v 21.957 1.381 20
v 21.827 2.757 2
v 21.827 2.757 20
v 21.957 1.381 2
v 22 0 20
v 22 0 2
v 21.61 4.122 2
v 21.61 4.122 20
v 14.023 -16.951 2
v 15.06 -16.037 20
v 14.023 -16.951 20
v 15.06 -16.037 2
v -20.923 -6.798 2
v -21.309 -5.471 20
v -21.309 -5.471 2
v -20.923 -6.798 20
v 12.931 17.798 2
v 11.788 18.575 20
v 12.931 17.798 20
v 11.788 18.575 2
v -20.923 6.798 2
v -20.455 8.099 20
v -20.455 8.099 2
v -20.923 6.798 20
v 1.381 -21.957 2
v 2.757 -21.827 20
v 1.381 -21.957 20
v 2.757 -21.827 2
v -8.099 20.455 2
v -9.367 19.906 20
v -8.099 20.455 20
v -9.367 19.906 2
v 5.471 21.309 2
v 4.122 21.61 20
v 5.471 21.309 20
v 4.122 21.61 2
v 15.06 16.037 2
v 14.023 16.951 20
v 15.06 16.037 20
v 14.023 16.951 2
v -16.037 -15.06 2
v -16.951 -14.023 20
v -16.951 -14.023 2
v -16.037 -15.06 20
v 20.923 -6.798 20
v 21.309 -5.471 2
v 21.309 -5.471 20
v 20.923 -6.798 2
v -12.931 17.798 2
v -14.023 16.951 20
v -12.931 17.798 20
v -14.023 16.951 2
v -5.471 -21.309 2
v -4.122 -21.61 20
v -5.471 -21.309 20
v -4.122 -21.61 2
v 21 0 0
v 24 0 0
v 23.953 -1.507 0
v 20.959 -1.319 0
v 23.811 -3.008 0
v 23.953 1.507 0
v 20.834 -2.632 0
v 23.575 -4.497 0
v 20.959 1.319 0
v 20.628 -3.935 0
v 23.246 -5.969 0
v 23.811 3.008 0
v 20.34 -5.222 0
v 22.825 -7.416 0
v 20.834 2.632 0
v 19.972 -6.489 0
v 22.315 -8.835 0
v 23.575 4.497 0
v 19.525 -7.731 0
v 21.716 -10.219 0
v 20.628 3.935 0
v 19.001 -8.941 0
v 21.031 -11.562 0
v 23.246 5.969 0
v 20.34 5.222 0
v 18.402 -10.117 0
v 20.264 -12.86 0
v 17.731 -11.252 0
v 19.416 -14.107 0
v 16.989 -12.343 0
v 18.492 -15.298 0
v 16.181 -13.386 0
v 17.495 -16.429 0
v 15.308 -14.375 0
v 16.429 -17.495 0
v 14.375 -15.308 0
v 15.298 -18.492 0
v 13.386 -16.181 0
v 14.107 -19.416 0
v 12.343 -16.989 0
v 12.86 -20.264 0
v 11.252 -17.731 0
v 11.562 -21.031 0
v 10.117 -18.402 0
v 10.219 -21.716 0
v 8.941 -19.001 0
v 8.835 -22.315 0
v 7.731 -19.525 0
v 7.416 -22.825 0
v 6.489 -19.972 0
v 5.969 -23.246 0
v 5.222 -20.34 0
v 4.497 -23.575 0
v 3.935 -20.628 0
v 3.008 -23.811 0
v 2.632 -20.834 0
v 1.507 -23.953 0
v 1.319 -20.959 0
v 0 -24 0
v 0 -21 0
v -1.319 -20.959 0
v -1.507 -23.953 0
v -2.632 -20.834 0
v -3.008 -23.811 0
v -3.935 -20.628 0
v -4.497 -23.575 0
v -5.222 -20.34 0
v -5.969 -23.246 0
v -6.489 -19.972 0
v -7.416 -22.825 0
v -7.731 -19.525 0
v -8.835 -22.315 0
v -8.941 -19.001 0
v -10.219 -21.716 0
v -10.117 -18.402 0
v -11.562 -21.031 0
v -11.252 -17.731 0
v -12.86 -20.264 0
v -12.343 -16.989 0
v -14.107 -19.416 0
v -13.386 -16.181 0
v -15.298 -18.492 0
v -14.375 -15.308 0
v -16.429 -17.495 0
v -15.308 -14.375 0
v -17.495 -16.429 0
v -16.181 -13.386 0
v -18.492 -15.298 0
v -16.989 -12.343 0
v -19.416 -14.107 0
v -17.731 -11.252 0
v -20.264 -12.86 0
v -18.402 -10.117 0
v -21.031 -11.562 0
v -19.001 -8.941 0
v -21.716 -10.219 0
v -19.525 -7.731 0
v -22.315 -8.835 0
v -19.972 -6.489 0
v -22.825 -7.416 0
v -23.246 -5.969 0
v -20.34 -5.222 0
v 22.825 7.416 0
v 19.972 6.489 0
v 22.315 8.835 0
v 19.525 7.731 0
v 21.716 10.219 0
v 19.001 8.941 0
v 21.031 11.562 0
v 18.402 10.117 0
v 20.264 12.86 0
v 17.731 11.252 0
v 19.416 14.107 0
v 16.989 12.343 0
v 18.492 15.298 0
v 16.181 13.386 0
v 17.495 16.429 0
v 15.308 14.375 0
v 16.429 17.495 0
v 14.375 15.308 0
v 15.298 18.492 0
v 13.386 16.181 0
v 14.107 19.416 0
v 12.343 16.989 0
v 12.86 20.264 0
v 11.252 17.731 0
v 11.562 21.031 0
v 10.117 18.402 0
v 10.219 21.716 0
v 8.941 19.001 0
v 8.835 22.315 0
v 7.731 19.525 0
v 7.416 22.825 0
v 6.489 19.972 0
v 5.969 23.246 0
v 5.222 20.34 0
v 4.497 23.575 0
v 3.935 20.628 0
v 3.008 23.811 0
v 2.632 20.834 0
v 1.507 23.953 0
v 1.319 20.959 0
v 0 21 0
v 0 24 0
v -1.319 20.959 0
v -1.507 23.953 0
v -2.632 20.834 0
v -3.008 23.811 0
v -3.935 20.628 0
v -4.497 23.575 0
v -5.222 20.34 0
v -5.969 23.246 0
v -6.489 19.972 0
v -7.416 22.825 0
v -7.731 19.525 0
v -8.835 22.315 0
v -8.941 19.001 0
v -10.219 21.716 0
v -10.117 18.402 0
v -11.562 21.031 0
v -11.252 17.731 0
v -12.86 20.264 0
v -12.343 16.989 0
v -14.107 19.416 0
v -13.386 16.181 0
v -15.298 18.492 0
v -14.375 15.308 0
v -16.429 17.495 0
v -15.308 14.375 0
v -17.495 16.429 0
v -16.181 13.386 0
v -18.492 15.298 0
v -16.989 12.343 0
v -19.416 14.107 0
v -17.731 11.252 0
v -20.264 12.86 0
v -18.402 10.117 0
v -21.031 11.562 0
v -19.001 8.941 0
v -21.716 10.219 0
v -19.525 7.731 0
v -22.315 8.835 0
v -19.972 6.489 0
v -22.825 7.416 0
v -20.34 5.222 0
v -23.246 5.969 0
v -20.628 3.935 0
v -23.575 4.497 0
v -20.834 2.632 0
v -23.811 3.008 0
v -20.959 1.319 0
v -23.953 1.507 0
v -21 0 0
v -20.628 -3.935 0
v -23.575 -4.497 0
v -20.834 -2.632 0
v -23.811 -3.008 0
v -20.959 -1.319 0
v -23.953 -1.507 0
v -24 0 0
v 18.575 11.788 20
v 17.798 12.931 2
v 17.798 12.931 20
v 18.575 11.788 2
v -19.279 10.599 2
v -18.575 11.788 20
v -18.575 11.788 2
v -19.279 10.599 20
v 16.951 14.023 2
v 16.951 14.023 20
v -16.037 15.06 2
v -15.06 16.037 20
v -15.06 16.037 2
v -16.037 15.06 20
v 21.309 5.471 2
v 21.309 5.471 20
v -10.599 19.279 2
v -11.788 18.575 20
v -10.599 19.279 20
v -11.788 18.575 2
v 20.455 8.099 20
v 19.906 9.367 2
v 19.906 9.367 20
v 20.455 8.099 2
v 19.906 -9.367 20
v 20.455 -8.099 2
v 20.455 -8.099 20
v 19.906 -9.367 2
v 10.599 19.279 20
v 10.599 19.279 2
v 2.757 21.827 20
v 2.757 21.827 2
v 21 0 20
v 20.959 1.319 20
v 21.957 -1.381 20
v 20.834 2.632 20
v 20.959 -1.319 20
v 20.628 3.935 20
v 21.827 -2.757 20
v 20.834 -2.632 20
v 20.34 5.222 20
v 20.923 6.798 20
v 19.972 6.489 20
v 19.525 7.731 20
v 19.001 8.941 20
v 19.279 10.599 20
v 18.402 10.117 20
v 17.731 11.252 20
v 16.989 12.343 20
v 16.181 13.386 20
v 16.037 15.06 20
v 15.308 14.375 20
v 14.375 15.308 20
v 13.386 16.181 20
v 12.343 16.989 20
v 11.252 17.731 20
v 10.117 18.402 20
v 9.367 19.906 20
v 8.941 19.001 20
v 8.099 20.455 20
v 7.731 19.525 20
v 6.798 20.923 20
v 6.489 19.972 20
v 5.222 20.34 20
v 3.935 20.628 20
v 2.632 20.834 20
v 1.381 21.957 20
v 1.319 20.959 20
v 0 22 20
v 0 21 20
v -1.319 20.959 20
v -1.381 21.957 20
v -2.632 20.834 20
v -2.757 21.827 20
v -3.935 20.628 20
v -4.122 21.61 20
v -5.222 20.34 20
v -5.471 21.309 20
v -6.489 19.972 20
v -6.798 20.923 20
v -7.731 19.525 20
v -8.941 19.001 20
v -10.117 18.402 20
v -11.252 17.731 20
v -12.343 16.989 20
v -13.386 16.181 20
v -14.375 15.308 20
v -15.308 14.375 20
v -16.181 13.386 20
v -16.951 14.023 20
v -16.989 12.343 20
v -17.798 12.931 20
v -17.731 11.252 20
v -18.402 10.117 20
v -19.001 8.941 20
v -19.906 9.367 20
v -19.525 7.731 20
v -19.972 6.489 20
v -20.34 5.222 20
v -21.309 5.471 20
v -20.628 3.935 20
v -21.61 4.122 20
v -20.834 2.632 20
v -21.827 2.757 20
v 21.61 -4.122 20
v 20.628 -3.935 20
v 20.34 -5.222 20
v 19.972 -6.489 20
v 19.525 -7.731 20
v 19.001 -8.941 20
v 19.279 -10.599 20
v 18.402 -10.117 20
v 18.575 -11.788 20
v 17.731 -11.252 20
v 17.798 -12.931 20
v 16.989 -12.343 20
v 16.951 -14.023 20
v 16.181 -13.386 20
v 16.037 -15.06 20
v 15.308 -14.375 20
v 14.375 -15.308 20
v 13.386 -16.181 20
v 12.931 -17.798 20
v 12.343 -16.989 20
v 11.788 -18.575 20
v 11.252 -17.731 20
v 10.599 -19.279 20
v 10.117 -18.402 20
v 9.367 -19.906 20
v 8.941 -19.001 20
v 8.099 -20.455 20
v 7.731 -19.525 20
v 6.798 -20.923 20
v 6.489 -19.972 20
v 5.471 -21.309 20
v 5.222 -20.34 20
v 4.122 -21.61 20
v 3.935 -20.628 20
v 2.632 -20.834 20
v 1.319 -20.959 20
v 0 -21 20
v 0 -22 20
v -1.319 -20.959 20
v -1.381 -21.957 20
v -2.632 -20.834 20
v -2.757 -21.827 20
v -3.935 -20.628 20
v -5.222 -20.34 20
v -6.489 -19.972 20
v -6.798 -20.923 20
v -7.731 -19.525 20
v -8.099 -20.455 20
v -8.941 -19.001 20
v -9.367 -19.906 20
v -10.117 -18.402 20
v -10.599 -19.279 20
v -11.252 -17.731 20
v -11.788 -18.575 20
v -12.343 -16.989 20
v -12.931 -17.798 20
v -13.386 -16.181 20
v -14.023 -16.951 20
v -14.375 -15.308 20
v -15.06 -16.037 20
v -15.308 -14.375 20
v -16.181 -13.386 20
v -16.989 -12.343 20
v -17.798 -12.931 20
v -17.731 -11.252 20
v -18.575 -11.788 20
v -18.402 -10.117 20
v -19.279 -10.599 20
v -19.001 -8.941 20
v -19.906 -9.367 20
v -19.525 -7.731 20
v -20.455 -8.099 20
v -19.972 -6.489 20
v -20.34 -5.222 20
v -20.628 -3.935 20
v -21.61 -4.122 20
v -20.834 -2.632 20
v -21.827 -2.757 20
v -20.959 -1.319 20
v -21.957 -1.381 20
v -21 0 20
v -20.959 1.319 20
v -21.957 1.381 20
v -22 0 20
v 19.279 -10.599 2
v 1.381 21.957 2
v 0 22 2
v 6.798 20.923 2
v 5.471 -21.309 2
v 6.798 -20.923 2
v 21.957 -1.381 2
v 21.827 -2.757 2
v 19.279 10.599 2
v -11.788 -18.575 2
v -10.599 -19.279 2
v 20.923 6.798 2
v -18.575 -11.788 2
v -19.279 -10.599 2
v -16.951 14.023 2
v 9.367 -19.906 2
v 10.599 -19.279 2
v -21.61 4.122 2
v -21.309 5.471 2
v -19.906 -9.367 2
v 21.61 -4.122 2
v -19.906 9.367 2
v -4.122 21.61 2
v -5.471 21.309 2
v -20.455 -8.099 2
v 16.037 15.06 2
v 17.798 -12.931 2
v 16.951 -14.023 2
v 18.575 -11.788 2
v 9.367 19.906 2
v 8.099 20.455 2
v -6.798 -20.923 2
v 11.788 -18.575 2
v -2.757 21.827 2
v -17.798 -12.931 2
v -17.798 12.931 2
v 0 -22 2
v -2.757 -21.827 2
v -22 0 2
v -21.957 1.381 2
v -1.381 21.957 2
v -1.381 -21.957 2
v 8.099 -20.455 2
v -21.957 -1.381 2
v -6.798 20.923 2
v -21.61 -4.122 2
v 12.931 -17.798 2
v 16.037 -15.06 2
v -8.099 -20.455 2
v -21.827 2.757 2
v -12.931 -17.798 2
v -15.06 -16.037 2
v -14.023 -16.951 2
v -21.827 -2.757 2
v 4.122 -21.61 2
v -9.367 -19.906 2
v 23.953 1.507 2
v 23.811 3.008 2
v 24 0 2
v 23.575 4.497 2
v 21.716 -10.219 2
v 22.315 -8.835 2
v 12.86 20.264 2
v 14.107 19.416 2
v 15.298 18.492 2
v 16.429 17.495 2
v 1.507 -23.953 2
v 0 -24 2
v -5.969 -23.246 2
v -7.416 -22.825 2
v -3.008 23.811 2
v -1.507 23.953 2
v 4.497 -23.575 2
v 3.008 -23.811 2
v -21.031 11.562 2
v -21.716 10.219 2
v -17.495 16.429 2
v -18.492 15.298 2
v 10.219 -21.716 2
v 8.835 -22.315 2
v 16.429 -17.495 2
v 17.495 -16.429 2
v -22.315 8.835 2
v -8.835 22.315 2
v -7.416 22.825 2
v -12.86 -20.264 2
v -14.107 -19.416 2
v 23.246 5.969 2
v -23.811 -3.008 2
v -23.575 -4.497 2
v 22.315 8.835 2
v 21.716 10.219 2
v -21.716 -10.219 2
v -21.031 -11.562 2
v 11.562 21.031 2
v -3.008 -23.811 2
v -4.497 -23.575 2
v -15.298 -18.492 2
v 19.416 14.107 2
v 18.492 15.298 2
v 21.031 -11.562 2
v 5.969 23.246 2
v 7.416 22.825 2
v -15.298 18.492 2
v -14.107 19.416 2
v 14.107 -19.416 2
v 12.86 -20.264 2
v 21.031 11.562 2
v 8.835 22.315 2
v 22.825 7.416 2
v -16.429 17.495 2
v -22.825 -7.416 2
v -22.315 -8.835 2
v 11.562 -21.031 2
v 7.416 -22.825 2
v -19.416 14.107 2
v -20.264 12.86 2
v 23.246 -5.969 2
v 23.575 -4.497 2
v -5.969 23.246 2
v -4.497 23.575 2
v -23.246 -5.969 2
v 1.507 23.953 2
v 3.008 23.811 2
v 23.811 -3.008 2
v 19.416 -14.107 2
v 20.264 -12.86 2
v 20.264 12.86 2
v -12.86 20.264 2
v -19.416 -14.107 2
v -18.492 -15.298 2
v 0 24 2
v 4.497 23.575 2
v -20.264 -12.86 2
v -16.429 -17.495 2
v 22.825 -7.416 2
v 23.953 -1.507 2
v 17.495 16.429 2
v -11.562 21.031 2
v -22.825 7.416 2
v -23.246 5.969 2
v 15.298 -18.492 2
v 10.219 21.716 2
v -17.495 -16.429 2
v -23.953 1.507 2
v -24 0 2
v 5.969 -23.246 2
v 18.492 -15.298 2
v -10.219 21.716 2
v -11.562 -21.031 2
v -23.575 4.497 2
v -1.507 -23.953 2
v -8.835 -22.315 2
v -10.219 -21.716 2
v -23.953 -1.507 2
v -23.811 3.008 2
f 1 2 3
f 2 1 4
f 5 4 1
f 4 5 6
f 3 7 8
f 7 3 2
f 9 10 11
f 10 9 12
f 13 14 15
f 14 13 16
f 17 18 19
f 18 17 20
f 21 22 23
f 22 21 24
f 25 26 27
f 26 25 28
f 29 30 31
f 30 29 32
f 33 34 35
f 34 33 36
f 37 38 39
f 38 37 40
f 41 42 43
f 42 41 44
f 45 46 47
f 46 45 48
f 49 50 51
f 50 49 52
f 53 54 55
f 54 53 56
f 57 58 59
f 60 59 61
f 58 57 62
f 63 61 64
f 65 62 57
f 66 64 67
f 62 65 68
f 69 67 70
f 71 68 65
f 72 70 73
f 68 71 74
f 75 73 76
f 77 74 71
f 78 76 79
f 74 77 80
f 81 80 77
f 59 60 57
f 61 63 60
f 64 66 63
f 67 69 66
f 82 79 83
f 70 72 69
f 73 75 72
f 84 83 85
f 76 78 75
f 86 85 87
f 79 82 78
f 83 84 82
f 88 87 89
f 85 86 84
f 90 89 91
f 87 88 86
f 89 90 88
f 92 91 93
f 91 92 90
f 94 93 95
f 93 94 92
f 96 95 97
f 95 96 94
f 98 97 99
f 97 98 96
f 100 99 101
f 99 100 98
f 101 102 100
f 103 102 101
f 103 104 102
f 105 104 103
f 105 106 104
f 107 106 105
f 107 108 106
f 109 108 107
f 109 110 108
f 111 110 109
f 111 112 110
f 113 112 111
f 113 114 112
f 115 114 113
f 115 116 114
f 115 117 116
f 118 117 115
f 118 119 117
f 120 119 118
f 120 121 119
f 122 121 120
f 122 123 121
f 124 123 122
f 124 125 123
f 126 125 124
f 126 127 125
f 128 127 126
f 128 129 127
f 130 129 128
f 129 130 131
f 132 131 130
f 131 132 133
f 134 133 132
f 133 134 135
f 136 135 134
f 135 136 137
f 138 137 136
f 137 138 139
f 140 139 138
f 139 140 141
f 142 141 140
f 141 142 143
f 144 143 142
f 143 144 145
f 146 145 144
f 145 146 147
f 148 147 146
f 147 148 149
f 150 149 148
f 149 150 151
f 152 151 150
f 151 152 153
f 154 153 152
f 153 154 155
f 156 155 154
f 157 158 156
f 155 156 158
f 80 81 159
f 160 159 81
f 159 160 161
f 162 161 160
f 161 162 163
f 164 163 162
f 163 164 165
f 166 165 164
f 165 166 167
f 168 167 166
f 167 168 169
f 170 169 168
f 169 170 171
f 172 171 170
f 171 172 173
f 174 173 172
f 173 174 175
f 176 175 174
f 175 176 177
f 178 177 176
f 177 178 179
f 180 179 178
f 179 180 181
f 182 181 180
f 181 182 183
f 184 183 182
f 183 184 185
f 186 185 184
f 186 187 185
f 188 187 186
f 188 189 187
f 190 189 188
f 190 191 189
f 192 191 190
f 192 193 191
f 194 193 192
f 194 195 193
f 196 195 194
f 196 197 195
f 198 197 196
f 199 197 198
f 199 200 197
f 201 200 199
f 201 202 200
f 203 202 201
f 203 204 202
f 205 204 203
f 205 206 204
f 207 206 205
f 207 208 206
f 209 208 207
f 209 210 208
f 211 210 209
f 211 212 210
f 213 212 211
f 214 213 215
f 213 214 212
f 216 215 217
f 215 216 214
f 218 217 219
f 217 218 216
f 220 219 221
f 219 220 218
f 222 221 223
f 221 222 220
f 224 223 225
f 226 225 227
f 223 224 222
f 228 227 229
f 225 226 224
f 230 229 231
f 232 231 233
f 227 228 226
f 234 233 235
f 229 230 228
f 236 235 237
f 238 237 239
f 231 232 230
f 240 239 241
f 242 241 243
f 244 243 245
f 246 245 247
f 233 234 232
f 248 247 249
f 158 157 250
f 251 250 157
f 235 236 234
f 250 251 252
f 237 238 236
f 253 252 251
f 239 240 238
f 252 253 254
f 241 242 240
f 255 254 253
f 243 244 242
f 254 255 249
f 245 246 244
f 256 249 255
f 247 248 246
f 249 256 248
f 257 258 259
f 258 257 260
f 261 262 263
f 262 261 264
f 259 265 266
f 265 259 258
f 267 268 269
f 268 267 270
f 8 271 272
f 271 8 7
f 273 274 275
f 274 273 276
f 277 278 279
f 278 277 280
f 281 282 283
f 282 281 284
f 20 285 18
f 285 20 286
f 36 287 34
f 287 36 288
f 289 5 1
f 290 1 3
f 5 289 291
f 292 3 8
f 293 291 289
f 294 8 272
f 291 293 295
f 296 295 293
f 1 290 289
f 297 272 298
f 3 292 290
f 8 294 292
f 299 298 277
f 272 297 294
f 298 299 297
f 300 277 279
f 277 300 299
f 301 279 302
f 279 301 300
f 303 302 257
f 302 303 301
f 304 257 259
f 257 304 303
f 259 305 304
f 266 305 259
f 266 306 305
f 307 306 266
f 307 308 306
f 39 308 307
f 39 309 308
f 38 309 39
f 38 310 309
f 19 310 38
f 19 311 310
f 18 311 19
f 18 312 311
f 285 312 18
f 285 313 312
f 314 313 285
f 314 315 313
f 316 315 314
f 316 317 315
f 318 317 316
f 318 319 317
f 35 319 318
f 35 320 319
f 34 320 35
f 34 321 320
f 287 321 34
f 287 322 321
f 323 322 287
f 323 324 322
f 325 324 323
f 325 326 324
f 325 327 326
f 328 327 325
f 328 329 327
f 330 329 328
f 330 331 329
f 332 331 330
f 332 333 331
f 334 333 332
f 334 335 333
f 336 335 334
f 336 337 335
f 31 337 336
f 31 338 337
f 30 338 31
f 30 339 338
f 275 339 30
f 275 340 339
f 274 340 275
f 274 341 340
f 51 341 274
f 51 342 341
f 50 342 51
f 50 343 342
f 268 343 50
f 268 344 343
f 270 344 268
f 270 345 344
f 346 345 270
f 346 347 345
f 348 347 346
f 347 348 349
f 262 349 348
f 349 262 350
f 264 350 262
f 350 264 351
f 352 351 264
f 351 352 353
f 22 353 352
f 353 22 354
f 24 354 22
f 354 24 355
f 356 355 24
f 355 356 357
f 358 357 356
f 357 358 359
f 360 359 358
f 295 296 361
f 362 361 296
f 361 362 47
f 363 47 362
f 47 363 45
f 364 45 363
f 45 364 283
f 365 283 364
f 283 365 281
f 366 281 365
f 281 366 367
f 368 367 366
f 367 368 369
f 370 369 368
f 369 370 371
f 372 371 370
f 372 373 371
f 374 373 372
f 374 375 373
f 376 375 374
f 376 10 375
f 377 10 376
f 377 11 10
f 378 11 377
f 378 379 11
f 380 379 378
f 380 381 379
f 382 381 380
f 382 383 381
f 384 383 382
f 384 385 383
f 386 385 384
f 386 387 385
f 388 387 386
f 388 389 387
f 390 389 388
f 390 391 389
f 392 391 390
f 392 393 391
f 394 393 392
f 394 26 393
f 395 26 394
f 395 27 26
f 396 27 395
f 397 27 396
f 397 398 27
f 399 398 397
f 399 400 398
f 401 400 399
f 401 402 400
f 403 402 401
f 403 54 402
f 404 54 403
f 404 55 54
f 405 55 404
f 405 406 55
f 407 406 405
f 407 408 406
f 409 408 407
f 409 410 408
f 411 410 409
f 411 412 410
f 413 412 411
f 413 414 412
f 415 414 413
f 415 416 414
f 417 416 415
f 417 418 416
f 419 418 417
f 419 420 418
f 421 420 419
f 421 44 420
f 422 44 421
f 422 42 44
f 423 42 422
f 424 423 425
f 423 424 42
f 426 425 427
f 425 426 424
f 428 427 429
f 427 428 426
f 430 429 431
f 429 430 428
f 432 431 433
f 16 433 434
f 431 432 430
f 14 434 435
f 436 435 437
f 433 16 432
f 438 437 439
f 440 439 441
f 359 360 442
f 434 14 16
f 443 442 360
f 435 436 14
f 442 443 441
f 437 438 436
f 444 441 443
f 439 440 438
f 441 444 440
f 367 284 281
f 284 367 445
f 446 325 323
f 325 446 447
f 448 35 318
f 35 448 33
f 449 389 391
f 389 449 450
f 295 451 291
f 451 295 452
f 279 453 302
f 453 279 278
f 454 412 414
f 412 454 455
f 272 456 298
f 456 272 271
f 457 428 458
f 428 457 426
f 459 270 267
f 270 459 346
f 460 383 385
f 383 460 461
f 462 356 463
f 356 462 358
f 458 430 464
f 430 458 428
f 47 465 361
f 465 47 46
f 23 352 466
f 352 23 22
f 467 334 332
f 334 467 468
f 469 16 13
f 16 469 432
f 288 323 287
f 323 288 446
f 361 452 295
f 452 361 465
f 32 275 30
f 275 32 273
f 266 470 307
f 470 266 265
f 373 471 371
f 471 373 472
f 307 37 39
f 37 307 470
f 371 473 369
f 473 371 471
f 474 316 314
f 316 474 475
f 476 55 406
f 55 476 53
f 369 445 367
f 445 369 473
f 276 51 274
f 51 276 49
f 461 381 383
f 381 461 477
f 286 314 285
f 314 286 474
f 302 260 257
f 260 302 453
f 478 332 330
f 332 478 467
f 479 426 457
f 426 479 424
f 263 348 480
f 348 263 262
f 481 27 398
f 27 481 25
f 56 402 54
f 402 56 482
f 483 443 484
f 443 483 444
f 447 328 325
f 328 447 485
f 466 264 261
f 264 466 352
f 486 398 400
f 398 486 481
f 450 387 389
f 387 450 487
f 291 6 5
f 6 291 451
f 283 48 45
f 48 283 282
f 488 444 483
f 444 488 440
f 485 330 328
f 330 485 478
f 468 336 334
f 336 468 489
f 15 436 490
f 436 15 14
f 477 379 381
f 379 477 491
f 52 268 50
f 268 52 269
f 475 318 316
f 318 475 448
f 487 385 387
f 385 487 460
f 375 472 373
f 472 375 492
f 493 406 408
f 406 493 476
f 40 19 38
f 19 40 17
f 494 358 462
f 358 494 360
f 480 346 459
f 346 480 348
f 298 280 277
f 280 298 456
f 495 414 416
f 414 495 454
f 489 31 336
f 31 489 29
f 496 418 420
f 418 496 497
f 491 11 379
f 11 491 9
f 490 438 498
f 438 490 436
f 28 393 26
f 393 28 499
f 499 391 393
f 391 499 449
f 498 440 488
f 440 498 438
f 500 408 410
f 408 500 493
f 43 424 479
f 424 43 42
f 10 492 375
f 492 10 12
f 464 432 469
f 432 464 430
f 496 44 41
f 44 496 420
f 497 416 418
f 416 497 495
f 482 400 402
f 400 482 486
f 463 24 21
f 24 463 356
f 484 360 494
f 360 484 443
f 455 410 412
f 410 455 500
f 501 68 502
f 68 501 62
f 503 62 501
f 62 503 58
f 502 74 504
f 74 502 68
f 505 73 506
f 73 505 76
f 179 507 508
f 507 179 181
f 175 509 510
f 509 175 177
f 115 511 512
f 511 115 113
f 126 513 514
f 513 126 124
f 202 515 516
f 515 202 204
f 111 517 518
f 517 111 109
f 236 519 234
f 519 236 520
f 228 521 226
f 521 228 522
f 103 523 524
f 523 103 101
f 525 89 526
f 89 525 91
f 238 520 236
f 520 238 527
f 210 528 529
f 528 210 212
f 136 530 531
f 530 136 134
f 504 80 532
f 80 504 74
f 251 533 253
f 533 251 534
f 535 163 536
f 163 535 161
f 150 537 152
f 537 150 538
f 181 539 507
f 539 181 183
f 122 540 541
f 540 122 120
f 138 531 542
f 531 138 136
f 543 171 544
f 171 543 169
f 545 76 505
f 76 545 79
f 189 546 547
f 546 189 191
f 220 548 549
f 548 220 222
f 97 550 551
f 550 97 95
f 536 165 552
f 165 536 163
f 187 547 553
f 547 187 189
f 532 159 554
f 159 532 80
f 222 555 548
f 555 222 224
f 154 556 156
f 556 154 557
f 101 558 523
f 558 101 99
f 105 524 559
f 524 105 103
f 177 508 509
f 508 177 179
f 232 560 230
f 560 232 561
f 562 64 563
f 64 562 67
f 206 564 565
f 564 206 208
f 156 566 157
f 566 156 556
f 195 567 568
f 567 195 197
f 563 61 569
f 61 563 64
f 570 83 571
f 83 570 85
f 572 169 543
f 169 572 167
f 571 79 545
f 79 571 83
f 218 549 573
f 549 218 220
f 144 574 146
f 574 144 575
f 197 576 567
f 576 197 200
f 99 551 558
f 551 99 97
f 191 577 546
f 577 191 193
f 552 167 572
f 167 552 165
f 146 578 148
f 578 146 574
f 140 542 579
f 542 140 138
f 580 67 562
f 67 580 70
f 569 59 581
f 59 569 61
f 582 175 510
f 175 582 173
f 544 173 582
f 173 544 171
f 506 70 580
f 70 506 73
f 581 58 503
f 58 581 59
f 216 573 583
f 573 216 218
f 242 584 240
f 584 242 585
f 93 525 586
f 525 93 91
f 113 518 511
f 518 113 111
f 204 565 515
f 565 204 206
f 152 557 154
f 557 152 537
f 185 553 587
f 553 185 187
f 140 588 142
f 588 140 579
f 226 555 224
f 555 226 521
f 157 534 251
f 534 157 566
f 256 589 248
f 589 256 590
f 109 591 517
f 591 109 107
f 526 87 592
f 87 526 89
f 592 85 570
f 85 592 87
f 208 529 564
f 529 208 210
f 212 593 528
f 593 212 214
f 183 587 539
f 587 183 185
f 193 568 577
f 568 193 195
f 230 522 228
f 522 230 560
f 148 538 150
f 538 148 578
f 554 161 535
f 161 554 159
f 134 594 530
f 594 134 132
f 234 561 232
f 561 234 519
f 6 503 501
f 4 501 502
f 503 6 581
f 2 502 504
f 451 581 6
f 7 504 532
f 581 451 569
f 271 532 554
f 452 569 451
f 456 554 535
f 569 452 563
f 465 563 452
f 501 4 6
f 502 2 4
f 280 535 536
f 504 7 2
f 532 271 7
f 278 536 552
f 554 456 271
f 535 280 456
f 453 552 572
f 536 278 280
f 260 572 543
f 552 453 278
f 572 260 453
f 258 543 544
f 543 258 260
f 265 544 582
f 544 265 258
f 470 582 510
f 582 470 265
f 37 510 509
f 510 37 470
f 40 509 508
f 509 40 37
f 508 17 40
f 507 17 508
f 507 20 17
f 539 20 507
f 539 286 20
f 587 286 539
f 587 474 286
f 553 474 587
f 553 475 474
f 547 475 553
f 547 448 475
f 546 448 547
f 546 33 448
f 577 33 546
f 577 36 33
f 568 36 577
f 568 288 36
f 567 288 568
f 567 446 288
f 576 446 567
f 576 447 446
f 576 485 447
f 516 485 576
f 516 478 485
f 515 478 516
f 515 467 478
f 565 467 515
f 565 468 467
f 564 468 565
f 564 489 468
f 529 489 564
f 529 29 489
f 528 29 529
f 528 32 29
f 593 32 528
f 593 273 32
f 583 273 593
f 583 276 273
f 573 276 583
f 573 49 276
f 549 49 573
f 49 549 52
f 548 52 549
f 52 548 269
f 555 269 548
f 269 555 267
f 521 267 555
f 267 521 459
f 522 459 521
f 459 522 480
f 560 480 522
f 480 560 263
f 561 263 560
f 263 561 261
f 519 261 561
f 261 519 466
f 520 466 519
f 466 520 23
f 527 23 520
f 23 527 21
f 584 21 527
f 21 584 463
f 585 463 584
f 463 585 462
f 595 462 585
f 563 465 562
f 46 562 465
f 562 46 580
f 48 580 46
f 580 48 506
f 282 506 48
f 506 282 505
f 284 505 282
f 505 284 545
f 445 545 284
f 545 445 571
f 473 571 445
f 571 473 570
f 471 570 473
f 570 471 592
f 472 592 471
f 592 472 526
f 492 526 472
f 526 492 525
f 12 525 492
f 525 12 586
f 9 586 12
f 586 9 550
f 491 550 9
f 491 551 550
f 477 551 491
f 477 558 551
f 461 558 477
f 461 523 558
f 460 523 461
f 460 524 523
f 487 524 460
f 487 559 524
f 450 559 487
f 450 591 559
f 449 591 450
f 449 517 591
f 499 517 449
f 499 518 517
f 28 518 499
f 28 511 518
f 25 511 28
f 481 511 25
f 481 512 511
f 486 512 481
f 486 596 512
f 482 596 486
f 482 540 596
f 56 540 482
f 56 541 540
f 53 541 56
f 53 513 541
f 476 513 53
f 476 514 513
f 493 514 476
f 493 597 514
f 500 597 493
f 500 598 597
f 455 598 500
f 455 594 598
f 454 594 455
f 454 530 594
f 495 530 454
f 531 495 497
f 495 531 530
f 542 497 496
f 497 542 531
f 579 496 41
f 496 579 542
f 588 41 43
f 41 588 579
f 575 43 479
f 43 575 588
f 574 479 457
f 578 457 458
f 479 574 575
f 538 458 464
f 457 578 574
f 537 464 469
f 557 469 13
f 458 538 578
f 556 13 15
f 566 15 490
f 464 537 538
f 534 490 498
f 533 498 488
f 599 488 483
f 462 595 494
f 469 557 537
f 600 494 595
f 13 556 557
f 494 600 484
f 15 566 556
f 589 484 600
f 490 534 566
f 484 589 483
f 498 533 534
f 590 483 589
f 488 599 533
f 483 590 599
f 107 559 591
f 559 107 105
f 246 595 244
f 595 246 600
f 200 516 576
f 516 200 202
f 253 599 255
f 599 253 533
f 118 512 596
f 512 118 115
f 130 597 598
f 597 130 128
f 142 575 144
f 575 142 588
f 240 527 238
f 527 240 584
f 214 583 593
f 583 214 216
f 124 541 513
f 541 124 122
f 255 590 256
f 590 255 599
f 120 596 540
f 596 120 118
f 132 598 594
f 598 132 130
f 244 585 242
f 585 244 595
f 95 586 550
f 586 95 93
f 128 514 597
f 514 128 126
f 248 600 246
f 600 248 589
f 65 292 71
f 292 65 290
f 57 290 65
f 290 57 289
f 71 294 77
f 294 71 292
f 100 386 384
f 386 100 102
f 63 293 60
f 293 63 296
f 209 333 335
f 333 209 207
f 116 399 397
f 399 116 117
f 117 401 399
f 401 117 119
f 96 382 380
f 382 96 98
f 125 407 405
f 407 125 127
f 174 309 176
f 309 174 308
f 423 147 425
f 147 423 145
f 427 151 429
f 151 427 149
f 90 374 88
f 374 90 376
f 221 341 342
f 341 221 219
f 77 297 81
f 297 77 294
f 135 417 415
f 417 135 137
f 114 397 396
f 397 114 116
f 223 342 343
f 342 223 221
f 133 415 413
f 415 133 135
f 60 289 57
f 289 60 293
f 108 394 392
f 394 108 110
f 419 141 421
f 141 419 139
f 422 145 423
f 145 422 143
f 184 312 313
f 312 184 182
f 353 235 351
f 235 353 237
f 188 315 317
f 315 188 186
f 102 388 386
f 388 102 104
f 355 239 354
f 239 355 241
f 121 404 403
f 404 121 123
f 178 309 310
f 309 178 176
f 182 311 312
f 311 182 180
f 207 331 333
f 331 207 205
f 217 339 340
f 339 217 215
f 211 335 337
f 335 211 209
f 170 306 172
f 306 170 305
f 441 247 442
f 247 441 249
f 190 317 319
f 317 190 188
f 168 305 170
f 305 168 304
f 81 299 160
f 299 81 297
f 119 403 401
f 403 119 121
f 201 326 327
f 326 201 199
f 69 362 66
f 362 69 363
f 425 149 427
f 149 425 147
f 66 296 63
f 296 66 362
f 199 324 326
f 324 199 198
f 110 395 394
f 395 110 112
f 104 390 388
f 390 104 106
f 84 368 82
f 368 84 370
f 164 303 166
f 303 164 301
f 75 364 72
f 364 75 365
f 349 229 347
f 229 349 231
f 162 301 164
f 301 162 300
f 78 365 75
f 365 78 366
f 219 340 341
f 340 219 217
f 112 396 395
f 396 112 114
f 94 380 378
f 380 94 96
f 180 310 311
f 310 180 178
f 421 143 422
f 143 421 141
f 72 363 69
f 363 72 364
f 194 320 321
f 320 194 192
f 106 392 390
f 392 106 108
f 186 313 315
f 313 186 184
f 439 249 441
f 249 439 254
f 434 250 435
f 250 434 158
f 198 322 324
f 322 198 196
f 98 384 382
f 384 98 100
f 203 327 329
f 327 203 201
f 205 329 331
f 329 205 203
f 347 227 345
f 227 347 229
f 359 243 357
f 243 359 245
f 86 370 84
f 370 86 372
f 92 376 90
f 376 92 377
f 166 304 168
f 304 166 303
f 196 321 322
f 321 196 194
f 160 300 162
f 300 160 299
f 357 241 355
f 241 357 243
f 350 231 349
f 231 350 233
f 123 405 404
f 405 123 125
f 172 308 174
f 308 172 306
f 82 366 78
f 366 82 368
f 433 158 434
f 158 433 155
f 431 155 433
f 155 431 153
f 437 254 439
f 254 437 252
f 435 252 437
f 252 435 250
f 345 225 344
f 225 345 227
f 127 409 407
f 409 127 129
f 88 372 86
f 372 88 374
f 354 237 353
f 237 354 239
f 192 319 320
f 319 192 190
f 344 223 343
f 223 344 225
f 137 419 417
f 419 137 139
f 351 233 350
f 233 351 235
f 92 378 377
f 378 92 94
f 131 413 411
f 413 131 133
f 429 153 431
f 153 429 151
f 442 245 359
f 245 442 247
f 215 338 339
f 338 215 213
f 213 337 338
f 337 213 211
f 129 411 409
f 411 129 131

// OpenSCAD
$fn=100;

difference() {
	union() {
		cylinder(r=22, h=20);
		cylinder(r=24, h=2);
	}
	cylinder(r=21, h=20);
}
